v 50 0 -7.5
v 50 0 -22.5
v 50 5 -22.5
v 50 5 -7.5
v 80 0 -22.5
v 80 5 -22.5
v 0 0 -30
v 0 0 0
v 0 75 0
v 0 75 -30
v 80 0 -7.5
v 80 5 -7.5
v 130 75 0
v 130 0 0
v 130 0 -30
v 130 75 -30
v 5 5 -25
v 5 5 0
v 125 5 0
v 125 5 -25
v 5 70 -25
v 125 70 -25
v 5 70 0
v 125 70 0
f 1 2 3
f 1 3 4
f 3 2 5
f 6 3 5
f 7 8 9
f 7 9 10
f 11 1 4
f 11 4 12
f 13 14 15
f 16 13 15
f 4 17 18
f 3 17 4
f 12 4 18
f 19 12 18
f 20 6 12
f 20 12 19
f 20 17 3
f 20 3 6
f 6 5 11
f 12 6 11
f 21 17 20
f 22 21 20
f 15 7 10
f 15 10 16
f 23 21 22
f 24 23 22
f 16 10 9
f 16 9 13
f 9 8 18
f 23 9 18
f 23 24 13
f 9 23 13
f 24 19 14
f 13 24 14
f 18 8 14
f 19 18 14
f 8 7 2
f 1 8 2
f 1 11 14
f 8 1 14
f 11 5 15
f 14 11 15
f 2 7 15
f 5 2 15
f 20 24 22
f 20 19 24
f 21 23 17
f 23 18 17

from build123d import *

# Parameters (mm, degrees)
SKETCH1_W           = 130
SKETCH1_H           = 30
BOSS_EXTRUDE1_DEPTH = 75
SHELL1_T            = -5
CUT_EXTRUDE1_REACH  = 77
SKETCH2_W           = 30
SKETCH2_H           = 15


with BuildPart() as part:
    # Sketch1 → Boss-Extrude1 (new body)
    with BuildSketch(Plane(origin=(0, 0, 0), x_dir=(1, 0, 0), z_dir=(0, 1, 0))):
        with Locations((65, 15)):
            Rectangle(SKETCH1_W, SKETCH1_H)
    extrude(amount=BOSS_EXTRUDE1_DEPTH)

    # Shell1
    shell1_openings = [part.faces().sort_by_distance(p)[0] for p in [
        (65, 37.5, 0),
    ]]
    offset(amount=SHELL1_T, openings=shell1_openings, kind=Kind.INTERSECTION)

    # Sketch2 → Cut-Extrude1 (cut, up to next)
    with BuildSketch(Plane.XZ, mode=Mode.PRIVATE) as cut_extrude1_sk1:
        with Locations((65, -15)):
            Rectangle(SKETCH2_W, SKETCH2_H)
    cut_extrude1_tool1 = extrude(cut_extrude1_sk1.sketch, amount=-CUT_EXTRUDE1_REACH, mode=Mode.PRIVATE) & part.part
    add(cut_extrude1_tool1.solids().sort_by_distance((65, 0, -15))[0], mode=Mode.SUBTRACT)


solid = part.part
